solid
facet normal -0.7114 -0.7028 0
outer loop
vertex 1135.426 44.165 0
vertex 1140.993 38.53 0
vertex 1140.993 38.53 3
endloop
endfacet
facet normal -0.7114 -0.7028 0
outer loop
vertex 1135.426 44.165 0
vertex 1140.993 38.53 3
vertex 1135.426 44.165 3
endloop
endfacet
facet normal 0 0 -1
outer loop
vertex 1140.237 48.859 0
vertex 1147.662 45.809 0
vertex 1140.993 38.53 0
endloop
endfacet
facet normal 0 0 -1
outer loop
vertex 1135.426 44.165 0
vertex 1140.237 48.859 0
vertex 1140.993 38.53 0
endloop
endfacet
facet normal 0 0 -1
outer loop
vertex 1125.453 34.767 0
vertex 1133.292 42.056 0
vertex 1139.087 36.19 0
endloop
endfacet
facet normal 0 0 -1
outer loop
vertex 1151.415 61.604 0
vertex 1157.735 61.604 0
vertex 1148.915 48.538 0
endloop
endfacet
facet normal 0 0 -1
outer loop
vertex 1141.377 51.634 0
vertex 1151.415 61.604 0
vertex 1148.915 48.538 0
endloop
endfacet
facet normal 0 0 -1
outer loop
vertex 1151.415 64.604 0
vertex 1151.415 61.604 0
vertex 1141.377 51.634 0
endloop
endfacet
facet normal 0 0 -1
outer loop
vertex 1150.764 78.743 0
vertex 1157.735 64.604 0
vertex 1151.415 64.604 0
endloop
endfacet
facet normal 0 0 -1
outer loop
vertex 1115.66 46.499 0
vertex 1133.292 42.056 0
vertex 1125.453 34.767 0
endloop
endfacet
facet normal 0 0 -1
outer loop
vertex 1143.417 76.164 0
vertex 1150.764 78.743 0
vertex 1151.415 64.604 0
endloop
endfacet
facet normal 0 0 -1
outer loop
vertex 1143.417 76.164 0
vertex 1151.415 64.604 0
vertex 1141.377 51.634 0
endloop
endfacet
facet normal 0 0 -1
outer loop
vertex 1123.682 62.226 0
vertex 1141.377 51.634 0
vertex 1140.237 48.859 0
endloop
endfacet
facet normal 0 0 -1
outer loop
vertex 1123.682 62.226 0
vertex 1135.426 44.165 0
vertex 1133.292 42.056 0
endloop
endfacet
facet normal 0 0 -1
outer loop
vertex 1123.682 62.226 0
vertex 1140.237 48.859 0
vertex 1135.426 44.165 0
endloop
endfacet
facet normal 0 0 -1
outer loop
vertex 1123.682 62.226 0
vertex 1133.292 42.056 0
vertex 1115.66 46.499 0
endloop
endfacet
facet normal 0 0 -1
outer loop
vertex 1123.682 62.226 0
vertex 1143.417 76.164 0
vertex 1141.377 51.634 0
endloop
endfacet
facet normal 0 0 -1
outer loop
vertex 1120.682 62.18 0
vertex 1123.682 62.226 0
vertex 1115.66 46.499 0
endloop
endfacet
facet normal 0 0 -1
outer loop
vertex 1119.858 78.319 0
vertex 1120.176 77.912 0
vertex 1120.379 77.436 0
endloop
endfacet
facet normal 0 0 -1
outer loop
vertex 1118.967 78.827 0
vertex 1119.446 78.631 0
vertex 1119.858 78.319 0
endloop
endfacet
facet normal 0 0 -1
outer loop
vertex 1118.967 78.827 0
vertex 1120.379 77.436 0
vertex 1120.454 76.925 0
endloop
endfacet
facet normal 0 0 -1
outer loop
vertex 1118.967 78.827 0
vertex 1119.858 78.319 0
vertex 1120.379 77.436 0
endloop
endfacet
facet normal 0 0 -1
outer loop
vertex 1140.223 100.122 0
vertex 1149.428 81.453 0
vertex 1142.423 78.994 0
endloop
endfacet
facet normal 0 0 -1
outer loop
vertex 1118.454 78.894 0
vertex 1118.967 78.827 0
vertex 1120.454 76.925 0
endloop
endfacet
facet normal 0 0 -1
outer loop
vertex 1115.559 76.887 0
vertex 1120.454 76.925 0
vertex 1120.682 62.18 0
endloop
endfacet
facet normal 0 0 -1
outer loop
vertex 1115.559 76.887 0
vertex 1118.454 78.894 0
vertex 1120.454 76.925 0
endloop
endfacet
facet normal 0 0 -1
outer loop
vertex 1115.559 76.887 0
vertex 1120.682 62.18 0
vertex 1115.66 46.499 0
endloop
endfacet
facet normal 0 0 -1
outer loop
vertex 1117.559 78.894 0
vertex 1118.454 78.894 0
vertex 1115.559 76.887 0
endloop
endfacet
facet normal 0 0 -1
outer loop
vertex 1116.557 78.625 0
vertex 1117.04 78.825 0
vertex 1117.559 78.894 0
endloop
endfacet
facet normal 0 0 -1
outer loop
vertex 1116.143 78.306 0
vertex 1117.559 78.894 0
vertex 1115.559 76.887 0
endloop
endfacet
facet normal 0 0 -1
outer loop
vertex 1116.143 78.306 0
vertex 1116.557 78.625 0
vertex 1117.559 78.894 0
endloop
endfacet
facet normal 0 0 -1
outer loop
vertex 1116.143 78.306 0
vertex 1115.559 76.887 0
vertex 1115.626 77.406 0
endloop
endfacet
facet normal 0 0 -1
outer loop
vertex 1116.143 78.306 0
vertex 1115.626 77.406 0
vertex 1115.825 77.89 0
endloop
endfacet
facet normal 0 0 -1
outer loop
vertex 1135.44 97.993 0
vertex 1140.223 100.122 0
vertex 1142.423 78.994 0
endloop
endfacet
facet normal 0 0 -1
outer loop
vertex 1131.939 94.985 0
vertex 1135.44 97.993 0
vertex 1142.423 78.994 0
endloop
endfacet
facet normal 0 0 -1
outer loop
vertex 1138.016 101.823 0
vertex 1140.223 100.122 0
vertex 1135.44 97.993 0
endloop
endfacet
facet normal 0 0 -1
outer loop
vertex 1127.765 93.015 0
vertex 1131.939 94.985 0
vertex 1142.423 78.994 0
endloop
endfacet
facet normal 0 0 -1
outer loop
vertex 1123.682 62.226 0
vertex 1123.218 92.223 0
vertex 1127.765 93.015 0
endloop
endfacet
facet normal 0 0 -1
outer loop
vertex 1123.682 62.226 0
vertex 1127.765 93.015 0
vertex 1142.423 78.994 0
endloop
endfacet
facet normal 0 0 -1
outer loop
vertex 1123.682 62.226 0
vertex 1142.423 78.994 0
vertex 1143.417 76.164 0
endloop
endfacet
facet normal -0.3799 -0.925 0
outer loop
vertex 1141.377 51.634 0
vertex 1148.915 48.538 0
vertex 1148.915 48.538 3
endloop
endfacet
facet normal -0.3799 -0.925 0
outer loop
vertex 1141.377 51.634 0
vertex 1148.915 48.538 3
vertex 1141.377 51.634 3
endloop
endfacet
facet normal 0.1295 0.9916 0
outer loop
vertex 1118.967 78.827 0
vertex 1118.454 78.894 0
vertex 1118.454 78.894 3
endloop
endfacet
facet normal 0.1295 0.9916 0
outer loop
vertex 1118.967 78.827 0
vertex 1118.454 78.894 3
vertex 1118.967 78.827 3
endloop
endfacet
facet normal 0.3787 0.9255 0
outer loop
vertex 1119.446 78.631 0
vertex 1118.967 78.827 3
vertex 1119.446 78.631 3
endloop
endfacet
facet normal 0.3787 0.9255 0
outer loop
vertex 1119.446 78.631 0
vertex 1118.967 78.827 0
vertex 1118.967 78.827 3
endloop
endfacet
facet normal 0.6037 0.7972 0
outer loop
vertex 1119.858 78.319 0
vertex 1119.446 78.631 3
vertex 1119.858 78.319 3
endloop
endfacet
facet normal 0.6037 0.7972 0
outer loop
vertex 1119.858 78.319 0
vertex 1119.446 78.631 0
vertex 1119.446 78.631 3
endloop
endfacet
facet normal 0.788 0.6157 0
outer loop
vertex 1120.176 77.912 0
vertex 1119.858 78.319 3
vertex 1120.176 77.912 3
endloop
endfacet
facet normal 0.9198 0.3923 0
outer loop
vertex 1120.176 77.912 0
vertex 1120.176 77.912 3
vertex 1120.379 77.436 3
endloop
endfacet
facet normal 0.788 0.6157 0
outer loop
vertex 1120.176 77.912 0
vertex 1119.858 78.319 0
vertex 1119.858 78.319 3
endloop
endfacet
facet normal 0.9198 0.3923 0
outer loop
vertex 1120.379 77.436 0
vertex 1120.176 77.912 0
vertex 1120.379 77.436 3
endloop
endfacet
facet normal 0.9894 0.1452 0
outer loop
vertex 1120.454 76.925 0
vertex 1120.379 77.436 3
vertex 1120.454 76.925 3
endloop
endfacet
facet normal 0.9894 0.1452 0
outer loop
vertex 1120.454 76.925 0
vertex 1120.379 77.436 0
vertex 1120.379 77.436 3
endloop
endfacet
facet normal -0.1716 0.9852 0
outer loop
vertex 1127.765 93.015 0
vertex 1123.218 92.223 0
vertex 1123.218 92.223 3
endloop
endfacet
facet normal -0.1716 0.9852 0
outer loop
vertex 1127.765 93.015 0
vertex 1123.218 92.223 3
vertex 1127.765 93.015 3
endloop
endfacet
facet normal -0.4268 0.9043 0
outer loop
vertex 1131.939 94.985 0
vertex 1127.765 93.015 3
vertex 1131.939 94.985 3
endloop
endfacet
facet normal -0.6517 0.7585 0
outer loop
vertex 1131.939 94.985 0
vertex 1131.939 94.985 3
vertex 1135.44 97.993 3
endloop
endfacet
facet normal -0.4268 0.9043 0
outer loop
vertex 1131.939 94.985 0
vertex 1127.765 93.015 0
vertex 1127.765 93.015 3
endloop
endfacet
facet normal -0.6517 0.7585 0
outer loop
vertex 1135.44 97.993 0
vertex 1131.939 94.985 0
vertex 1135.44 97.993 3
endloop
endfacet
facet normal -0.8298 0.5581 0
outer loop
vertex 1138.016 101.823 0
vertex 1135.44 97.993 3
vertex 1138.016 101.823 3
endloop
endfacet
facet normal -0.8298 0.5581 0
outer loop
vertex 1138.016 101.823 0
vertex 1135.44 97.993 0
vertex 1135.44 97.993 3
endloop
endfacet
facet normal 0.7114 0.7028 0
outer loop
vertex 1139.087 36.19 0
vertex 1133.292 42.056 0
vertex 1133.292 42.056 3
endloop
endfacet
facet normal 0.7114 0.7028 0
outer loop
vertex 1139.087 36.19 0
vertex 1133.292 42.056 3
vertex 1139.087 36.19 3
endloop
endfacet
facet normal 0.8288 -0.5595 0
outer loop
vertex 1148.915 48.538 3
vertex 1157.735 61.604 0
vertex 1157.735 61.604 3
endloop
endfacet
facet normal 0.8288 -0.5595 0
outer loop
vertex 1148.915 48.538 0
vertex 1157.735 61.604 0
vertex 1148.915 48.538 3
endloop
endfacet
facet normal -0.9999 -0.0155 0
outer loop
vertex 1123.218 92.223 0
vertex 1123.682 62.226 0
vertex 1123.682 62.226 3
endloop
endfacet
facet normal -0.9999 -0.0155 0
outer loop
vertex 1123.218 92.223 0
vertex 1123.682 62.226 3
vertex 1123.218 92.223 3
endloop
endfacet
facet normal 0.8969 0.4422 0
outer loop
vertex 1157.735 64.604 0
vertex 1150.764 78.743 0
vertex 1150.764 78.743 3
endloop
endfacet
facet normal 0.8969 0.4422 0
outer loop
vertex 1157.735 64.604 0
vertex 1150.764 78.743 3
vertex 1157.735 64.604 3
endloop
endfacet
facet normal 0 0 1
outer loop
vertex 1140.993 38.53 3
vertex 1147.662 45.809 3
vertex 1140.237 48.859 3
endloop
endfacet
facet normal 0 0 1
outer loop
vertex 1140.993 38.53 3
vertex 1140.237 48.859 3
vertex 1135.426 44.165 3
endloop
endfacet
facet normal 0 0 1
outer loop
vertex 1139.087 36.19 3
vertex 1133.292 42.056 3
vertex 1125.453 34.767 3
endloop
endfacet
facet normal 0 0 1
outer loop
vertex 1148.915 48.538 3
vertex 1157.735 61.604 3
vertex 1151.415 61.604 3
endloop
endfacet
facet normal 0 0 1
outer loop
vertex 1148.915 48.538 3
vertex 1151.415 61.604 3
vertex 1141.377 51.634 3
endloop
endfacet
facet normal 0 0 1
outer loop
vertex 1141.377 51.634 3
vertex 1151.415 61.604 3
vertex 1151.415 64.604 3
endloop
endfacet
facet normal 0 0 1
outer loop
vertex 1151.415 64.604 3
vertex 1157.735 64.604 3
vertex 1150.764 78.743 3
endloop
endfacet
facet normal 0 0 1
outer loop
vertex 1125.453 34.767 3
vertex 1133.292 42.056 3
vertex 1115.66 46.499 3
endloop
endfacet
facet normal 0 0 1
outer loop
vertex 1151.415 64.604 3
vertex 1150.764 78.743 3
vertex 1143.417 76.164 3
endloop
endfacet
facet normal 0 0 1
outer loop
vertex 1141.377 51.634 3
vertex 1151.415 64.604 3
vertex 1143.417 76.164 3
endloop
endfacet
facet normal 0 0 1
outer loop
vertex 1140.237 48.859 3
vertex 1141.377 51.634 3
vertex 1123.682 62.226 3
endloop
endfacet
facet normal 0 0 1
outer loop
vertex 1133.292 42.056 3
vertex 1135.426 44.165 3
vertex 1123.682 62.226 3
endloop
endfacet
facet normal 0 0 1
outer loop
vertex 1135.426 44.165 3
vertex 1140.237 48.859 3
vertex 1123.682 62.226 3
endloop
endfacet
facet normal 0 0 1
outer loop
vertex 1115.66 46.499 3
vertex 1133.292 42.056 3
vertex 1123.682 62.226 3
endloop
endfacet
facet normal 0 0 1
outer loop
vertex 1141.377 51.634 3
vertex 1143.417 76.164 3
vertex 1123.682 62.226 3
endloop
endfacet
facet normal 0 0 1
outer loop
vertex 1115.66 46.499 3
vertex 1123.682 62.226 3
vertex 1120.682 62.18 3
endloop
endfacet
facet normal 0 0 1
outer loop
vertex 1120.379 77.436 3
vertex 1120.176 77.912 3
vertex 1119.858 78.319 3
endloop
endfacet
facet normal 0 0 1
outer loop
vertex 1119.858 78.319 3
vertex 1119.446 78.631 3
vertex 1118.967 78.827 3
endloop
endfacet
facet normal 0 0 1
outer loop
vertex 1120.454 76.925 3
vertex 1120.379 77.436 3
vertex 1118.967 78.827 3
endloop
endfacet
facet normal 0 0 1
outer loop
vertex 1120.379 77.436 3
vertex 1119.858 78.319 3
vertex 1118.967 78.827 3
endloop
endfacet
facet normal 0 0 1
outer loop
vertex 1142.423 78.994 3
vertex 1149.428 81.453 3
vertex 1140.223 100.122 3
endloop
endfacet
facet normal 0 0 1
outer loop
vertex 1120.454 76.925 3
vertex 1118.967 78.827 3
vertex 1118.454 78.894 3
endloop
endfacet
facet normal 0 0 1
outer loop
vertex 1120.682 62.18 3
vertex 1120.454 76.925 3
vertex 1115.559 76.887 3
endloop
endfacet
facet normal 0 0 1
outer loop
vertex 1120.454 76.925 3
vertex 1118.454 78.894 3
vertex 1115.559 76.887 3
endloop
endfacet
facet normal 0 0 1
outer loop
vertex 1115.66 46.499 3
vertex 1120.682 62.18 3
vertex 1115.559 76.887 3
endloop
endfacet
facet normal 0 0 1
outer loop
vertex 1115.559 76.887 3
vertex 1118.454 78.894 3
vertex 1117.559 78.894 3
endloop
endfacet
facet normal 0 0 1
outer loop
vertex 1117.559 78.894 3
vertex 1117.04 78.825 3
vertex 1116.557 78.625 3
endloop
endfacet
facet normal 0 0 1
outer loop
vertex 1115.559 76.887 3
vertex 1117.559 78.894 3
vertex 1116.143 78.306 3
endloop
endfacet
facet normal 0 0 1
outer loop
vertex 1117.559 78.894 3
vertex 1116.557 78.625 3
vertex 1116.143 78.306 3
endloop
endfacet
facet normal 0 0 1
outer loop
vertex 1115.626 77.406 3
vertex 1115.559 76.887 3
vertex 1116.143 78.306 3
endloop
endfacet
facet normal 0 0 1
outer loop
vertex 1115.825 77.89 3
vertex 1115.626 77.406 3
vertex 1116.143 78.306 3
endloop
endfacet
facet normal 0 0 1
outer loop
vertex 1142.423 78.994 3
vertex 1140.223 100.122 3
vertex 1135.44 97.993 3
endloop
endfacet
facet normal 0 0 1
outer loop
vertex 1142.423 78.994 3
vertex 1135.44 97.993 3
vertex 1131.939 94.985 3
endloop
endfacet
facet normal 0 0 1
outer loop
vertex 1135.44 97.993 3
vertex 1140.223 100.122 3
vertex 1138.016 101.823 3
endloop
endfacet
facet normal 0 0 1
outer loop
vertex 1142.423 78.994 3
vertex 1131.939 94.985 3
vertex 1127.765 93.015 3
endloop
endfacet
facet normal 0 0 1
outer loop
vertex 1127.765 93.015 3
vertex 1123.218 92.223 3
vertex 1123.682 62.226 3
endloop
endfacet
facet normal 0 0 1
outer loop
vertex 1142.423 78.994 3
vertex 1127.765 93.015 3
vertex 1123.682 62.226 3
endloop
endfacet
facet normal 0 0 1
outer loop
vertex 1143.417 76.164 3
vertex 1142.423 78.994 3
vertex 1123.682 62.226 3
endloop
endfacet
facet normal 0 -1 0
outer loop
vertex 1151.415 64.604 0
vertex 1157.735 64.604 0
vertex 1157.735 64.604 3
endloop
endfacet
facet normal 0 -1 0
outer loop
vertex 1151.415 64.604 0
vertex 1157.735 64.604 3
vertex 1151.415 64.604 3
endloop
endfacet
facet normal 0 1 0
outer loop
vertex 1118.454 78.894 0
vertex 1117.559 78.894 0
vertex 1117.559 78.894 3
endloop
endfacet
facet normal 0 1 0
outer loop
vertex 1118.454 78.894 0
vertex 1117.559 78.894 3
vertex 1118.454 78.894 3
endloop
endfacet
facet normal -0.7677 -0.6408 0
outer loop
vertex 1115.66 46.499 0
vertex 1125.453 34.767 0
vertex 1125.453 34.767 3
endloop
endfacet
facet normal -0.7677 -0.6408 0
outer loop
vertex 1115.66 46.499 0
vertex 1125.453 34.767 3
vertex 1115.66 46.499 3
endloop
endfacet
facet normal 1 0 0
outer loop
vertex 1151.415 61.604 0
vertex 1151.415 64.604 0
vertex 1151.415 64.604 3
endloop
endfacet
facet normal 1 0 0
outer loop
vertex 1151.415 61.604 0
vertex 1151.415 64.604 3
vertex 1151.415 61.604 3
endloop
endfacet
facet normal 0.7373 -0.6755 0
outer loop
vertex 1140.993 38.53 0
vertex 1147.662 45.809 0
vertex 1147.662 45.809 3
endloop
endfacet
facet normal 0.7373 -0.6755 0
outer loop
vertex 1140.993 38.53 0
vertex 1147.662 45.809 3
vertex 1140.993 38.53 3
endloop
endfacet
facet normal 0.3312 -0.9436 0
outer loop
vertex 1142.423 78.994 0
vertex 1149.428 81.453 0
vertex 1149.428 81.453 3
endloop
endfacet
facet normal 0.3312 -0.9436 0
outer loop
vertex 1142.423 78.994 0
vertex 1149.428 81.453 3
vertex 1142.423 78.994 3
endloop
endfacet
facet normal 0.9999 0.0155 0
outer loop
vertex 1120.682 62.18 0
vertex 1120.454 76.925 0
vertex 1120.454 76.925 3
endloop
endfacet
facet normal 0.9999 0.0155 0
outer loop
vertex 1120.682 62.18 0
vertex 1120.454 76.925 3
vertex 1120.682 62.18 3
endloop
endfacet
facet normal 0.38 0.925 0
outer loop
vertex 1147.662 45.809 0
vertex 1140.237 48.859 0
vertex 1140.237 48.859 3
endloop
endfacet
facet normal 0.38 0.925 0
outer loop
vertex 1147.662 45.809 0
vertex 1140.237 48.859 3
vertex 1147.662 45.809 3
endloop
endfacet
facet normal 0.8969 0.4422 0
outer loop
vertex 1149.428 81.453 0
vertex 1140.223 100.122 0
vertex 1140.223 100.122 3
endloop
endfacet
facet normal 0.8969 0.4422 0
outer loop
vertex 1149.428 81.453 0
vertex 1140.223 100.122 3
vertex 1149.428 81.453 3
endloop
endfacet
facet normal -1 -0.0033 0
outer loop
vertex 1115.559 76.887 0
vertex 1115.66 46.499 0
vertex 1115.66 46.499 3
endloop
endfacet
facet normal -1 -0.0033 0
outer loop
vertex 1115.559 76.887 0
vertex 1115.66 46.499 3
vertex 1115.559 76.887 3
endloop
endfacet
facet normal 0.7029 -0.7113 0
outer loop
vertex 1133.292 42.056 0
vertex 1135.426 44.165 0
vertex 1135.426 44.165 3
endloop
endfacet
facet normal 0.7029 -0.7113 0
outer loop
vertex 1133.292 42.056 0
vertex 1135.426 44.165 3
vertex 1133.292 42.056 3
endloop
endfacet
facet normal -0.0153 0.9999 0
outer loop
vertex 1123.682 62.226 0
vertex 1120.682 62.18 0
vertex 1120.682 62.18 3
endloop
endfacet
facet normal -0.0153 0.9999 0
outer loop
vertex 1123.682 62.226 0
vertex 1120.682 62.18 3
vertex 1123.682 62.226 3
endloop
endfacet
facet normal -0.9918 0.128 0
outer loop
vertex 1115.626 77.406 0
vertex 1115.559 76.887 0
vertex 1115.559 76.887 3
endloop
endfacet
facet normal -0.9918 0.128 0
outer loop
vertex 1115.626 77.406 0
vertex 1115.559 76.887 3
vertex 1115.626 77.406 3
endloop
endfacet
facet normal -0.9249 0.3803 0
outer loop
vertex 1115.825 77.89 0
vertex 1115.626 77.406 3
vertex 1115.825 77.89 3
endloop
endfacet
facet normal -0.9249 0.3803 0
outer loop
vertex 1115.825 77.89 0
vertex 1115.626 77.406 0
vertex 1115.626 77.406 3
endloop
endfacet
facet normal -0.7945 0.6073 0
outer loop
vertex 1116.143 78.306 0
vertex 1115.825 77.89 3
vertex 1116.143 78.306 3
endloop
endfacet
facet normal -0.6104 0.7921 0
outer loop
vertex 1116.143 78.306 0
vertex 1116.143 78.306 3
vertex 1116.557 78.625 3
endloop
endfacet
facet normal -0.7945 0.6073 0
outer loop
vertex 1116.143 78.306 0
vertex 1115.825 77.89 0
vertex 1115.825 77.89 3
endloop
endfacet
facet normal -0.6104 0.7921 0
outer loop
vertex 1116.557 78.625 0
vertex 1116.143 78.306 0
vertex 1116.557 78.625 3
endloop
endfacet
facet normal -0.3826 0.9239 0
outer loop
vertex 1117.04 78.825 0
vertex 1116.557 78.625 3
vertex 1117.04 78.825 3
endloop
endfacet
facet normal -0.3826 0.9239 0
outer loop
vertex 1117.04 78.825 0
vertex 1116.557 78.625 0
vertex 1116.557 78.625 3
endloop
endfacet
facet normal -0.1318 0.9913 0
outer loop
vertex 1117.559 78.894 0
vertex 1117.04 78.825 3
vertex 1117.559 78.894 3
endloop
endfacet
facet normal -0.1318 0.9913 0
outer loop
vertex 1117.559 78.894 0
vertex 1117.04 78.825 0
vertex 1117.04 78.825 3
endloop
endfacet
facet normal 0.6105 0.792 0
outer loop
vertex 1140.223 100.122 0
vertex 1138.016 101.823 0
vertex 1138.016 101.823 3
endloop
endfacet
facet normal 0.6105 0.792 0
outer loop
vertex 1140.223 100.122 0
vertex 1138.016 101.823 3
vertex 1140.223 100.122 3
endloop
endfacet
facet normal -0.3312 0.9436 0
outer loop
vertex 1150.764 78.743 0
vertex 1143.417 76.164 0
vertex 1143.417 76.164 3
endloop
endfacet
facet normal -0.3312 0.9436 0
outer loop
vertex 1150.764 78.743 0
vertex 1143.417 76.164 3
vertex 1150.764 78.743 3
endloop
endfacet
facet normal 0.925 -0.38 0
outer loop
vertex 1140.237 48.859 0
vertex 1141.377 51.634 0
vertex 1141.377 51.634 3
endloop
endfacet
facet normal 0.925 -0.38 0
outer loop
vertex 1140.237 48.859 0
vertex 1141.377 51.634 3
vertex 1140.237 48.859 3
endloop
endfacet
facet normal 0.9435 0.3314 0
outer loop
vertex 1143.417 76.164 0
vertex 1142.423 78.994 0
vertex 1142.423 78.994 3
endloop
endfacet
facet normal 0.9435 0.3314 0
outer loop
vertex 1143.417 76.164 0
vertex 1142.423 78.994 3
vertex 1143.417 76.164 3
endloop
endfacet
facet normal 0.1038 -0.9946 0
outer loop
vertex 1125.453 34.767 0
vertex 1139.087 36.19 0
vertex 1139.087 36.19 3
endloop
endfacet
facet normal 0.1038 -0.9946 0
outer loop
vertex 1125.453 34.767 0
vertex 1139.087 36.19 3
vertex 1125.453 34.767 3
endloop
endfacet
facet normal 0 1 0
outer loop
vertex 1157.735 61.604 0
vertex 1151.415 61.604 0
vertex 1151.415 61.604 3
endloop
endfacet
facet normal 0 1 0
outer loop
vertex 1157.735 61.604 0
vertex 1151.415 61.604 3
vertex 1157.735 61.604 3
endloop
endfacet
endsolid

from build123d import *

# Parameters (mm, degrees)
BASE_EXTRUDE_DEPTH = 3


with BuildPart() as part:
    # Sketch1 → Base-Extrude (new body)
    with BuildSketch(Plane.XY):
        with BuildLine():
            Line((1123.682056814, 62.226353312), (1123.217824039, 92.222761229))
            ThreePointArc((1123.217824039, 92.222761229), (1131.93888948, 94.9852284), (1138.016482209, 101.822704098))
            Line((1138.016482209, 101.822704098), (1140.223428748, 100.122354582))
            Line((1140.223428748, 100.122354582), (1149.427763829, 81.453359638))
            Line((1149.427763829, 81.453359638), (1142.423370566, 78.994416072))
            Line((1142.423370566, 78.994416072), (1143.41708769, 76.163775459))
            Line((1143.41708769, 76.163775459), (1150.764055432, 78.742982306))
            Line((1150.764055432, 78.742982306), (1157.735111853, 64.603708156))
            Line((1157.735111853, 64.603708156), (1151.41486057, 64.603708156))
            Line((1151.41486057, 64.603708156), (1151.41486057, 61.603708156))
            Line((1151.41486057, 61.603708156), (1157.735111853, 61.603708156))
            Line((1157.735111853, 61.603708156), (1148.914752181, 48.53787652))
            Line((1148.914752181, 48.53787652), (1141.376892152, 51.634018924))
            Line((1141.376892152, 51.634018924), (1140.237061373, 48.858989953))
            Line((1140.237061373, 48.858989953), (1147.661839843, 45.809295294))
            Line((1147.661839843, 45.809295294), (1140.993007118, 38.529613243))
            Line((1140.993007118, 38.529613243), (1135.426293127, 44.164590139))
            Line((1135.426293127, 44.164590139), (1133.292085124, 42.056236232))
            Line((1133.292085124, 42.056236232), (1139.086791645, 36.190471003))
            Line((1139.086791645, 36.190471003), (1125.452564162, 34.76659158))
            Line((1125.452564162, 34.76659158), (1115.659628086, 46.499294412))
            Line((1115.659628086, 46.499294412), (1115.559210016, 76.887215732))
            ThreePointArc((1115.559210016, 76.887215732), (1116.142650811, 78.305699753), (1117.559199096, 78.893824774))
            Line((1117.559199096, 78.893824774), (1118.454460183, 78.893824774))
            ThreePointArc((1118.454460183, 78.893824774), (1119.857689012, 78.318938401), (1120.454220711, 76.924773625))
            Line((1120.454220711, 76.924773625), (1120.682416022, 62.179930034))
            Line((1120.682416022, 62.179930034), (1123.682056814, 62.226353312))
        make_face()
    extrude(amount=BASE_EXTRUDE_DEPTH)


solid = part.part
